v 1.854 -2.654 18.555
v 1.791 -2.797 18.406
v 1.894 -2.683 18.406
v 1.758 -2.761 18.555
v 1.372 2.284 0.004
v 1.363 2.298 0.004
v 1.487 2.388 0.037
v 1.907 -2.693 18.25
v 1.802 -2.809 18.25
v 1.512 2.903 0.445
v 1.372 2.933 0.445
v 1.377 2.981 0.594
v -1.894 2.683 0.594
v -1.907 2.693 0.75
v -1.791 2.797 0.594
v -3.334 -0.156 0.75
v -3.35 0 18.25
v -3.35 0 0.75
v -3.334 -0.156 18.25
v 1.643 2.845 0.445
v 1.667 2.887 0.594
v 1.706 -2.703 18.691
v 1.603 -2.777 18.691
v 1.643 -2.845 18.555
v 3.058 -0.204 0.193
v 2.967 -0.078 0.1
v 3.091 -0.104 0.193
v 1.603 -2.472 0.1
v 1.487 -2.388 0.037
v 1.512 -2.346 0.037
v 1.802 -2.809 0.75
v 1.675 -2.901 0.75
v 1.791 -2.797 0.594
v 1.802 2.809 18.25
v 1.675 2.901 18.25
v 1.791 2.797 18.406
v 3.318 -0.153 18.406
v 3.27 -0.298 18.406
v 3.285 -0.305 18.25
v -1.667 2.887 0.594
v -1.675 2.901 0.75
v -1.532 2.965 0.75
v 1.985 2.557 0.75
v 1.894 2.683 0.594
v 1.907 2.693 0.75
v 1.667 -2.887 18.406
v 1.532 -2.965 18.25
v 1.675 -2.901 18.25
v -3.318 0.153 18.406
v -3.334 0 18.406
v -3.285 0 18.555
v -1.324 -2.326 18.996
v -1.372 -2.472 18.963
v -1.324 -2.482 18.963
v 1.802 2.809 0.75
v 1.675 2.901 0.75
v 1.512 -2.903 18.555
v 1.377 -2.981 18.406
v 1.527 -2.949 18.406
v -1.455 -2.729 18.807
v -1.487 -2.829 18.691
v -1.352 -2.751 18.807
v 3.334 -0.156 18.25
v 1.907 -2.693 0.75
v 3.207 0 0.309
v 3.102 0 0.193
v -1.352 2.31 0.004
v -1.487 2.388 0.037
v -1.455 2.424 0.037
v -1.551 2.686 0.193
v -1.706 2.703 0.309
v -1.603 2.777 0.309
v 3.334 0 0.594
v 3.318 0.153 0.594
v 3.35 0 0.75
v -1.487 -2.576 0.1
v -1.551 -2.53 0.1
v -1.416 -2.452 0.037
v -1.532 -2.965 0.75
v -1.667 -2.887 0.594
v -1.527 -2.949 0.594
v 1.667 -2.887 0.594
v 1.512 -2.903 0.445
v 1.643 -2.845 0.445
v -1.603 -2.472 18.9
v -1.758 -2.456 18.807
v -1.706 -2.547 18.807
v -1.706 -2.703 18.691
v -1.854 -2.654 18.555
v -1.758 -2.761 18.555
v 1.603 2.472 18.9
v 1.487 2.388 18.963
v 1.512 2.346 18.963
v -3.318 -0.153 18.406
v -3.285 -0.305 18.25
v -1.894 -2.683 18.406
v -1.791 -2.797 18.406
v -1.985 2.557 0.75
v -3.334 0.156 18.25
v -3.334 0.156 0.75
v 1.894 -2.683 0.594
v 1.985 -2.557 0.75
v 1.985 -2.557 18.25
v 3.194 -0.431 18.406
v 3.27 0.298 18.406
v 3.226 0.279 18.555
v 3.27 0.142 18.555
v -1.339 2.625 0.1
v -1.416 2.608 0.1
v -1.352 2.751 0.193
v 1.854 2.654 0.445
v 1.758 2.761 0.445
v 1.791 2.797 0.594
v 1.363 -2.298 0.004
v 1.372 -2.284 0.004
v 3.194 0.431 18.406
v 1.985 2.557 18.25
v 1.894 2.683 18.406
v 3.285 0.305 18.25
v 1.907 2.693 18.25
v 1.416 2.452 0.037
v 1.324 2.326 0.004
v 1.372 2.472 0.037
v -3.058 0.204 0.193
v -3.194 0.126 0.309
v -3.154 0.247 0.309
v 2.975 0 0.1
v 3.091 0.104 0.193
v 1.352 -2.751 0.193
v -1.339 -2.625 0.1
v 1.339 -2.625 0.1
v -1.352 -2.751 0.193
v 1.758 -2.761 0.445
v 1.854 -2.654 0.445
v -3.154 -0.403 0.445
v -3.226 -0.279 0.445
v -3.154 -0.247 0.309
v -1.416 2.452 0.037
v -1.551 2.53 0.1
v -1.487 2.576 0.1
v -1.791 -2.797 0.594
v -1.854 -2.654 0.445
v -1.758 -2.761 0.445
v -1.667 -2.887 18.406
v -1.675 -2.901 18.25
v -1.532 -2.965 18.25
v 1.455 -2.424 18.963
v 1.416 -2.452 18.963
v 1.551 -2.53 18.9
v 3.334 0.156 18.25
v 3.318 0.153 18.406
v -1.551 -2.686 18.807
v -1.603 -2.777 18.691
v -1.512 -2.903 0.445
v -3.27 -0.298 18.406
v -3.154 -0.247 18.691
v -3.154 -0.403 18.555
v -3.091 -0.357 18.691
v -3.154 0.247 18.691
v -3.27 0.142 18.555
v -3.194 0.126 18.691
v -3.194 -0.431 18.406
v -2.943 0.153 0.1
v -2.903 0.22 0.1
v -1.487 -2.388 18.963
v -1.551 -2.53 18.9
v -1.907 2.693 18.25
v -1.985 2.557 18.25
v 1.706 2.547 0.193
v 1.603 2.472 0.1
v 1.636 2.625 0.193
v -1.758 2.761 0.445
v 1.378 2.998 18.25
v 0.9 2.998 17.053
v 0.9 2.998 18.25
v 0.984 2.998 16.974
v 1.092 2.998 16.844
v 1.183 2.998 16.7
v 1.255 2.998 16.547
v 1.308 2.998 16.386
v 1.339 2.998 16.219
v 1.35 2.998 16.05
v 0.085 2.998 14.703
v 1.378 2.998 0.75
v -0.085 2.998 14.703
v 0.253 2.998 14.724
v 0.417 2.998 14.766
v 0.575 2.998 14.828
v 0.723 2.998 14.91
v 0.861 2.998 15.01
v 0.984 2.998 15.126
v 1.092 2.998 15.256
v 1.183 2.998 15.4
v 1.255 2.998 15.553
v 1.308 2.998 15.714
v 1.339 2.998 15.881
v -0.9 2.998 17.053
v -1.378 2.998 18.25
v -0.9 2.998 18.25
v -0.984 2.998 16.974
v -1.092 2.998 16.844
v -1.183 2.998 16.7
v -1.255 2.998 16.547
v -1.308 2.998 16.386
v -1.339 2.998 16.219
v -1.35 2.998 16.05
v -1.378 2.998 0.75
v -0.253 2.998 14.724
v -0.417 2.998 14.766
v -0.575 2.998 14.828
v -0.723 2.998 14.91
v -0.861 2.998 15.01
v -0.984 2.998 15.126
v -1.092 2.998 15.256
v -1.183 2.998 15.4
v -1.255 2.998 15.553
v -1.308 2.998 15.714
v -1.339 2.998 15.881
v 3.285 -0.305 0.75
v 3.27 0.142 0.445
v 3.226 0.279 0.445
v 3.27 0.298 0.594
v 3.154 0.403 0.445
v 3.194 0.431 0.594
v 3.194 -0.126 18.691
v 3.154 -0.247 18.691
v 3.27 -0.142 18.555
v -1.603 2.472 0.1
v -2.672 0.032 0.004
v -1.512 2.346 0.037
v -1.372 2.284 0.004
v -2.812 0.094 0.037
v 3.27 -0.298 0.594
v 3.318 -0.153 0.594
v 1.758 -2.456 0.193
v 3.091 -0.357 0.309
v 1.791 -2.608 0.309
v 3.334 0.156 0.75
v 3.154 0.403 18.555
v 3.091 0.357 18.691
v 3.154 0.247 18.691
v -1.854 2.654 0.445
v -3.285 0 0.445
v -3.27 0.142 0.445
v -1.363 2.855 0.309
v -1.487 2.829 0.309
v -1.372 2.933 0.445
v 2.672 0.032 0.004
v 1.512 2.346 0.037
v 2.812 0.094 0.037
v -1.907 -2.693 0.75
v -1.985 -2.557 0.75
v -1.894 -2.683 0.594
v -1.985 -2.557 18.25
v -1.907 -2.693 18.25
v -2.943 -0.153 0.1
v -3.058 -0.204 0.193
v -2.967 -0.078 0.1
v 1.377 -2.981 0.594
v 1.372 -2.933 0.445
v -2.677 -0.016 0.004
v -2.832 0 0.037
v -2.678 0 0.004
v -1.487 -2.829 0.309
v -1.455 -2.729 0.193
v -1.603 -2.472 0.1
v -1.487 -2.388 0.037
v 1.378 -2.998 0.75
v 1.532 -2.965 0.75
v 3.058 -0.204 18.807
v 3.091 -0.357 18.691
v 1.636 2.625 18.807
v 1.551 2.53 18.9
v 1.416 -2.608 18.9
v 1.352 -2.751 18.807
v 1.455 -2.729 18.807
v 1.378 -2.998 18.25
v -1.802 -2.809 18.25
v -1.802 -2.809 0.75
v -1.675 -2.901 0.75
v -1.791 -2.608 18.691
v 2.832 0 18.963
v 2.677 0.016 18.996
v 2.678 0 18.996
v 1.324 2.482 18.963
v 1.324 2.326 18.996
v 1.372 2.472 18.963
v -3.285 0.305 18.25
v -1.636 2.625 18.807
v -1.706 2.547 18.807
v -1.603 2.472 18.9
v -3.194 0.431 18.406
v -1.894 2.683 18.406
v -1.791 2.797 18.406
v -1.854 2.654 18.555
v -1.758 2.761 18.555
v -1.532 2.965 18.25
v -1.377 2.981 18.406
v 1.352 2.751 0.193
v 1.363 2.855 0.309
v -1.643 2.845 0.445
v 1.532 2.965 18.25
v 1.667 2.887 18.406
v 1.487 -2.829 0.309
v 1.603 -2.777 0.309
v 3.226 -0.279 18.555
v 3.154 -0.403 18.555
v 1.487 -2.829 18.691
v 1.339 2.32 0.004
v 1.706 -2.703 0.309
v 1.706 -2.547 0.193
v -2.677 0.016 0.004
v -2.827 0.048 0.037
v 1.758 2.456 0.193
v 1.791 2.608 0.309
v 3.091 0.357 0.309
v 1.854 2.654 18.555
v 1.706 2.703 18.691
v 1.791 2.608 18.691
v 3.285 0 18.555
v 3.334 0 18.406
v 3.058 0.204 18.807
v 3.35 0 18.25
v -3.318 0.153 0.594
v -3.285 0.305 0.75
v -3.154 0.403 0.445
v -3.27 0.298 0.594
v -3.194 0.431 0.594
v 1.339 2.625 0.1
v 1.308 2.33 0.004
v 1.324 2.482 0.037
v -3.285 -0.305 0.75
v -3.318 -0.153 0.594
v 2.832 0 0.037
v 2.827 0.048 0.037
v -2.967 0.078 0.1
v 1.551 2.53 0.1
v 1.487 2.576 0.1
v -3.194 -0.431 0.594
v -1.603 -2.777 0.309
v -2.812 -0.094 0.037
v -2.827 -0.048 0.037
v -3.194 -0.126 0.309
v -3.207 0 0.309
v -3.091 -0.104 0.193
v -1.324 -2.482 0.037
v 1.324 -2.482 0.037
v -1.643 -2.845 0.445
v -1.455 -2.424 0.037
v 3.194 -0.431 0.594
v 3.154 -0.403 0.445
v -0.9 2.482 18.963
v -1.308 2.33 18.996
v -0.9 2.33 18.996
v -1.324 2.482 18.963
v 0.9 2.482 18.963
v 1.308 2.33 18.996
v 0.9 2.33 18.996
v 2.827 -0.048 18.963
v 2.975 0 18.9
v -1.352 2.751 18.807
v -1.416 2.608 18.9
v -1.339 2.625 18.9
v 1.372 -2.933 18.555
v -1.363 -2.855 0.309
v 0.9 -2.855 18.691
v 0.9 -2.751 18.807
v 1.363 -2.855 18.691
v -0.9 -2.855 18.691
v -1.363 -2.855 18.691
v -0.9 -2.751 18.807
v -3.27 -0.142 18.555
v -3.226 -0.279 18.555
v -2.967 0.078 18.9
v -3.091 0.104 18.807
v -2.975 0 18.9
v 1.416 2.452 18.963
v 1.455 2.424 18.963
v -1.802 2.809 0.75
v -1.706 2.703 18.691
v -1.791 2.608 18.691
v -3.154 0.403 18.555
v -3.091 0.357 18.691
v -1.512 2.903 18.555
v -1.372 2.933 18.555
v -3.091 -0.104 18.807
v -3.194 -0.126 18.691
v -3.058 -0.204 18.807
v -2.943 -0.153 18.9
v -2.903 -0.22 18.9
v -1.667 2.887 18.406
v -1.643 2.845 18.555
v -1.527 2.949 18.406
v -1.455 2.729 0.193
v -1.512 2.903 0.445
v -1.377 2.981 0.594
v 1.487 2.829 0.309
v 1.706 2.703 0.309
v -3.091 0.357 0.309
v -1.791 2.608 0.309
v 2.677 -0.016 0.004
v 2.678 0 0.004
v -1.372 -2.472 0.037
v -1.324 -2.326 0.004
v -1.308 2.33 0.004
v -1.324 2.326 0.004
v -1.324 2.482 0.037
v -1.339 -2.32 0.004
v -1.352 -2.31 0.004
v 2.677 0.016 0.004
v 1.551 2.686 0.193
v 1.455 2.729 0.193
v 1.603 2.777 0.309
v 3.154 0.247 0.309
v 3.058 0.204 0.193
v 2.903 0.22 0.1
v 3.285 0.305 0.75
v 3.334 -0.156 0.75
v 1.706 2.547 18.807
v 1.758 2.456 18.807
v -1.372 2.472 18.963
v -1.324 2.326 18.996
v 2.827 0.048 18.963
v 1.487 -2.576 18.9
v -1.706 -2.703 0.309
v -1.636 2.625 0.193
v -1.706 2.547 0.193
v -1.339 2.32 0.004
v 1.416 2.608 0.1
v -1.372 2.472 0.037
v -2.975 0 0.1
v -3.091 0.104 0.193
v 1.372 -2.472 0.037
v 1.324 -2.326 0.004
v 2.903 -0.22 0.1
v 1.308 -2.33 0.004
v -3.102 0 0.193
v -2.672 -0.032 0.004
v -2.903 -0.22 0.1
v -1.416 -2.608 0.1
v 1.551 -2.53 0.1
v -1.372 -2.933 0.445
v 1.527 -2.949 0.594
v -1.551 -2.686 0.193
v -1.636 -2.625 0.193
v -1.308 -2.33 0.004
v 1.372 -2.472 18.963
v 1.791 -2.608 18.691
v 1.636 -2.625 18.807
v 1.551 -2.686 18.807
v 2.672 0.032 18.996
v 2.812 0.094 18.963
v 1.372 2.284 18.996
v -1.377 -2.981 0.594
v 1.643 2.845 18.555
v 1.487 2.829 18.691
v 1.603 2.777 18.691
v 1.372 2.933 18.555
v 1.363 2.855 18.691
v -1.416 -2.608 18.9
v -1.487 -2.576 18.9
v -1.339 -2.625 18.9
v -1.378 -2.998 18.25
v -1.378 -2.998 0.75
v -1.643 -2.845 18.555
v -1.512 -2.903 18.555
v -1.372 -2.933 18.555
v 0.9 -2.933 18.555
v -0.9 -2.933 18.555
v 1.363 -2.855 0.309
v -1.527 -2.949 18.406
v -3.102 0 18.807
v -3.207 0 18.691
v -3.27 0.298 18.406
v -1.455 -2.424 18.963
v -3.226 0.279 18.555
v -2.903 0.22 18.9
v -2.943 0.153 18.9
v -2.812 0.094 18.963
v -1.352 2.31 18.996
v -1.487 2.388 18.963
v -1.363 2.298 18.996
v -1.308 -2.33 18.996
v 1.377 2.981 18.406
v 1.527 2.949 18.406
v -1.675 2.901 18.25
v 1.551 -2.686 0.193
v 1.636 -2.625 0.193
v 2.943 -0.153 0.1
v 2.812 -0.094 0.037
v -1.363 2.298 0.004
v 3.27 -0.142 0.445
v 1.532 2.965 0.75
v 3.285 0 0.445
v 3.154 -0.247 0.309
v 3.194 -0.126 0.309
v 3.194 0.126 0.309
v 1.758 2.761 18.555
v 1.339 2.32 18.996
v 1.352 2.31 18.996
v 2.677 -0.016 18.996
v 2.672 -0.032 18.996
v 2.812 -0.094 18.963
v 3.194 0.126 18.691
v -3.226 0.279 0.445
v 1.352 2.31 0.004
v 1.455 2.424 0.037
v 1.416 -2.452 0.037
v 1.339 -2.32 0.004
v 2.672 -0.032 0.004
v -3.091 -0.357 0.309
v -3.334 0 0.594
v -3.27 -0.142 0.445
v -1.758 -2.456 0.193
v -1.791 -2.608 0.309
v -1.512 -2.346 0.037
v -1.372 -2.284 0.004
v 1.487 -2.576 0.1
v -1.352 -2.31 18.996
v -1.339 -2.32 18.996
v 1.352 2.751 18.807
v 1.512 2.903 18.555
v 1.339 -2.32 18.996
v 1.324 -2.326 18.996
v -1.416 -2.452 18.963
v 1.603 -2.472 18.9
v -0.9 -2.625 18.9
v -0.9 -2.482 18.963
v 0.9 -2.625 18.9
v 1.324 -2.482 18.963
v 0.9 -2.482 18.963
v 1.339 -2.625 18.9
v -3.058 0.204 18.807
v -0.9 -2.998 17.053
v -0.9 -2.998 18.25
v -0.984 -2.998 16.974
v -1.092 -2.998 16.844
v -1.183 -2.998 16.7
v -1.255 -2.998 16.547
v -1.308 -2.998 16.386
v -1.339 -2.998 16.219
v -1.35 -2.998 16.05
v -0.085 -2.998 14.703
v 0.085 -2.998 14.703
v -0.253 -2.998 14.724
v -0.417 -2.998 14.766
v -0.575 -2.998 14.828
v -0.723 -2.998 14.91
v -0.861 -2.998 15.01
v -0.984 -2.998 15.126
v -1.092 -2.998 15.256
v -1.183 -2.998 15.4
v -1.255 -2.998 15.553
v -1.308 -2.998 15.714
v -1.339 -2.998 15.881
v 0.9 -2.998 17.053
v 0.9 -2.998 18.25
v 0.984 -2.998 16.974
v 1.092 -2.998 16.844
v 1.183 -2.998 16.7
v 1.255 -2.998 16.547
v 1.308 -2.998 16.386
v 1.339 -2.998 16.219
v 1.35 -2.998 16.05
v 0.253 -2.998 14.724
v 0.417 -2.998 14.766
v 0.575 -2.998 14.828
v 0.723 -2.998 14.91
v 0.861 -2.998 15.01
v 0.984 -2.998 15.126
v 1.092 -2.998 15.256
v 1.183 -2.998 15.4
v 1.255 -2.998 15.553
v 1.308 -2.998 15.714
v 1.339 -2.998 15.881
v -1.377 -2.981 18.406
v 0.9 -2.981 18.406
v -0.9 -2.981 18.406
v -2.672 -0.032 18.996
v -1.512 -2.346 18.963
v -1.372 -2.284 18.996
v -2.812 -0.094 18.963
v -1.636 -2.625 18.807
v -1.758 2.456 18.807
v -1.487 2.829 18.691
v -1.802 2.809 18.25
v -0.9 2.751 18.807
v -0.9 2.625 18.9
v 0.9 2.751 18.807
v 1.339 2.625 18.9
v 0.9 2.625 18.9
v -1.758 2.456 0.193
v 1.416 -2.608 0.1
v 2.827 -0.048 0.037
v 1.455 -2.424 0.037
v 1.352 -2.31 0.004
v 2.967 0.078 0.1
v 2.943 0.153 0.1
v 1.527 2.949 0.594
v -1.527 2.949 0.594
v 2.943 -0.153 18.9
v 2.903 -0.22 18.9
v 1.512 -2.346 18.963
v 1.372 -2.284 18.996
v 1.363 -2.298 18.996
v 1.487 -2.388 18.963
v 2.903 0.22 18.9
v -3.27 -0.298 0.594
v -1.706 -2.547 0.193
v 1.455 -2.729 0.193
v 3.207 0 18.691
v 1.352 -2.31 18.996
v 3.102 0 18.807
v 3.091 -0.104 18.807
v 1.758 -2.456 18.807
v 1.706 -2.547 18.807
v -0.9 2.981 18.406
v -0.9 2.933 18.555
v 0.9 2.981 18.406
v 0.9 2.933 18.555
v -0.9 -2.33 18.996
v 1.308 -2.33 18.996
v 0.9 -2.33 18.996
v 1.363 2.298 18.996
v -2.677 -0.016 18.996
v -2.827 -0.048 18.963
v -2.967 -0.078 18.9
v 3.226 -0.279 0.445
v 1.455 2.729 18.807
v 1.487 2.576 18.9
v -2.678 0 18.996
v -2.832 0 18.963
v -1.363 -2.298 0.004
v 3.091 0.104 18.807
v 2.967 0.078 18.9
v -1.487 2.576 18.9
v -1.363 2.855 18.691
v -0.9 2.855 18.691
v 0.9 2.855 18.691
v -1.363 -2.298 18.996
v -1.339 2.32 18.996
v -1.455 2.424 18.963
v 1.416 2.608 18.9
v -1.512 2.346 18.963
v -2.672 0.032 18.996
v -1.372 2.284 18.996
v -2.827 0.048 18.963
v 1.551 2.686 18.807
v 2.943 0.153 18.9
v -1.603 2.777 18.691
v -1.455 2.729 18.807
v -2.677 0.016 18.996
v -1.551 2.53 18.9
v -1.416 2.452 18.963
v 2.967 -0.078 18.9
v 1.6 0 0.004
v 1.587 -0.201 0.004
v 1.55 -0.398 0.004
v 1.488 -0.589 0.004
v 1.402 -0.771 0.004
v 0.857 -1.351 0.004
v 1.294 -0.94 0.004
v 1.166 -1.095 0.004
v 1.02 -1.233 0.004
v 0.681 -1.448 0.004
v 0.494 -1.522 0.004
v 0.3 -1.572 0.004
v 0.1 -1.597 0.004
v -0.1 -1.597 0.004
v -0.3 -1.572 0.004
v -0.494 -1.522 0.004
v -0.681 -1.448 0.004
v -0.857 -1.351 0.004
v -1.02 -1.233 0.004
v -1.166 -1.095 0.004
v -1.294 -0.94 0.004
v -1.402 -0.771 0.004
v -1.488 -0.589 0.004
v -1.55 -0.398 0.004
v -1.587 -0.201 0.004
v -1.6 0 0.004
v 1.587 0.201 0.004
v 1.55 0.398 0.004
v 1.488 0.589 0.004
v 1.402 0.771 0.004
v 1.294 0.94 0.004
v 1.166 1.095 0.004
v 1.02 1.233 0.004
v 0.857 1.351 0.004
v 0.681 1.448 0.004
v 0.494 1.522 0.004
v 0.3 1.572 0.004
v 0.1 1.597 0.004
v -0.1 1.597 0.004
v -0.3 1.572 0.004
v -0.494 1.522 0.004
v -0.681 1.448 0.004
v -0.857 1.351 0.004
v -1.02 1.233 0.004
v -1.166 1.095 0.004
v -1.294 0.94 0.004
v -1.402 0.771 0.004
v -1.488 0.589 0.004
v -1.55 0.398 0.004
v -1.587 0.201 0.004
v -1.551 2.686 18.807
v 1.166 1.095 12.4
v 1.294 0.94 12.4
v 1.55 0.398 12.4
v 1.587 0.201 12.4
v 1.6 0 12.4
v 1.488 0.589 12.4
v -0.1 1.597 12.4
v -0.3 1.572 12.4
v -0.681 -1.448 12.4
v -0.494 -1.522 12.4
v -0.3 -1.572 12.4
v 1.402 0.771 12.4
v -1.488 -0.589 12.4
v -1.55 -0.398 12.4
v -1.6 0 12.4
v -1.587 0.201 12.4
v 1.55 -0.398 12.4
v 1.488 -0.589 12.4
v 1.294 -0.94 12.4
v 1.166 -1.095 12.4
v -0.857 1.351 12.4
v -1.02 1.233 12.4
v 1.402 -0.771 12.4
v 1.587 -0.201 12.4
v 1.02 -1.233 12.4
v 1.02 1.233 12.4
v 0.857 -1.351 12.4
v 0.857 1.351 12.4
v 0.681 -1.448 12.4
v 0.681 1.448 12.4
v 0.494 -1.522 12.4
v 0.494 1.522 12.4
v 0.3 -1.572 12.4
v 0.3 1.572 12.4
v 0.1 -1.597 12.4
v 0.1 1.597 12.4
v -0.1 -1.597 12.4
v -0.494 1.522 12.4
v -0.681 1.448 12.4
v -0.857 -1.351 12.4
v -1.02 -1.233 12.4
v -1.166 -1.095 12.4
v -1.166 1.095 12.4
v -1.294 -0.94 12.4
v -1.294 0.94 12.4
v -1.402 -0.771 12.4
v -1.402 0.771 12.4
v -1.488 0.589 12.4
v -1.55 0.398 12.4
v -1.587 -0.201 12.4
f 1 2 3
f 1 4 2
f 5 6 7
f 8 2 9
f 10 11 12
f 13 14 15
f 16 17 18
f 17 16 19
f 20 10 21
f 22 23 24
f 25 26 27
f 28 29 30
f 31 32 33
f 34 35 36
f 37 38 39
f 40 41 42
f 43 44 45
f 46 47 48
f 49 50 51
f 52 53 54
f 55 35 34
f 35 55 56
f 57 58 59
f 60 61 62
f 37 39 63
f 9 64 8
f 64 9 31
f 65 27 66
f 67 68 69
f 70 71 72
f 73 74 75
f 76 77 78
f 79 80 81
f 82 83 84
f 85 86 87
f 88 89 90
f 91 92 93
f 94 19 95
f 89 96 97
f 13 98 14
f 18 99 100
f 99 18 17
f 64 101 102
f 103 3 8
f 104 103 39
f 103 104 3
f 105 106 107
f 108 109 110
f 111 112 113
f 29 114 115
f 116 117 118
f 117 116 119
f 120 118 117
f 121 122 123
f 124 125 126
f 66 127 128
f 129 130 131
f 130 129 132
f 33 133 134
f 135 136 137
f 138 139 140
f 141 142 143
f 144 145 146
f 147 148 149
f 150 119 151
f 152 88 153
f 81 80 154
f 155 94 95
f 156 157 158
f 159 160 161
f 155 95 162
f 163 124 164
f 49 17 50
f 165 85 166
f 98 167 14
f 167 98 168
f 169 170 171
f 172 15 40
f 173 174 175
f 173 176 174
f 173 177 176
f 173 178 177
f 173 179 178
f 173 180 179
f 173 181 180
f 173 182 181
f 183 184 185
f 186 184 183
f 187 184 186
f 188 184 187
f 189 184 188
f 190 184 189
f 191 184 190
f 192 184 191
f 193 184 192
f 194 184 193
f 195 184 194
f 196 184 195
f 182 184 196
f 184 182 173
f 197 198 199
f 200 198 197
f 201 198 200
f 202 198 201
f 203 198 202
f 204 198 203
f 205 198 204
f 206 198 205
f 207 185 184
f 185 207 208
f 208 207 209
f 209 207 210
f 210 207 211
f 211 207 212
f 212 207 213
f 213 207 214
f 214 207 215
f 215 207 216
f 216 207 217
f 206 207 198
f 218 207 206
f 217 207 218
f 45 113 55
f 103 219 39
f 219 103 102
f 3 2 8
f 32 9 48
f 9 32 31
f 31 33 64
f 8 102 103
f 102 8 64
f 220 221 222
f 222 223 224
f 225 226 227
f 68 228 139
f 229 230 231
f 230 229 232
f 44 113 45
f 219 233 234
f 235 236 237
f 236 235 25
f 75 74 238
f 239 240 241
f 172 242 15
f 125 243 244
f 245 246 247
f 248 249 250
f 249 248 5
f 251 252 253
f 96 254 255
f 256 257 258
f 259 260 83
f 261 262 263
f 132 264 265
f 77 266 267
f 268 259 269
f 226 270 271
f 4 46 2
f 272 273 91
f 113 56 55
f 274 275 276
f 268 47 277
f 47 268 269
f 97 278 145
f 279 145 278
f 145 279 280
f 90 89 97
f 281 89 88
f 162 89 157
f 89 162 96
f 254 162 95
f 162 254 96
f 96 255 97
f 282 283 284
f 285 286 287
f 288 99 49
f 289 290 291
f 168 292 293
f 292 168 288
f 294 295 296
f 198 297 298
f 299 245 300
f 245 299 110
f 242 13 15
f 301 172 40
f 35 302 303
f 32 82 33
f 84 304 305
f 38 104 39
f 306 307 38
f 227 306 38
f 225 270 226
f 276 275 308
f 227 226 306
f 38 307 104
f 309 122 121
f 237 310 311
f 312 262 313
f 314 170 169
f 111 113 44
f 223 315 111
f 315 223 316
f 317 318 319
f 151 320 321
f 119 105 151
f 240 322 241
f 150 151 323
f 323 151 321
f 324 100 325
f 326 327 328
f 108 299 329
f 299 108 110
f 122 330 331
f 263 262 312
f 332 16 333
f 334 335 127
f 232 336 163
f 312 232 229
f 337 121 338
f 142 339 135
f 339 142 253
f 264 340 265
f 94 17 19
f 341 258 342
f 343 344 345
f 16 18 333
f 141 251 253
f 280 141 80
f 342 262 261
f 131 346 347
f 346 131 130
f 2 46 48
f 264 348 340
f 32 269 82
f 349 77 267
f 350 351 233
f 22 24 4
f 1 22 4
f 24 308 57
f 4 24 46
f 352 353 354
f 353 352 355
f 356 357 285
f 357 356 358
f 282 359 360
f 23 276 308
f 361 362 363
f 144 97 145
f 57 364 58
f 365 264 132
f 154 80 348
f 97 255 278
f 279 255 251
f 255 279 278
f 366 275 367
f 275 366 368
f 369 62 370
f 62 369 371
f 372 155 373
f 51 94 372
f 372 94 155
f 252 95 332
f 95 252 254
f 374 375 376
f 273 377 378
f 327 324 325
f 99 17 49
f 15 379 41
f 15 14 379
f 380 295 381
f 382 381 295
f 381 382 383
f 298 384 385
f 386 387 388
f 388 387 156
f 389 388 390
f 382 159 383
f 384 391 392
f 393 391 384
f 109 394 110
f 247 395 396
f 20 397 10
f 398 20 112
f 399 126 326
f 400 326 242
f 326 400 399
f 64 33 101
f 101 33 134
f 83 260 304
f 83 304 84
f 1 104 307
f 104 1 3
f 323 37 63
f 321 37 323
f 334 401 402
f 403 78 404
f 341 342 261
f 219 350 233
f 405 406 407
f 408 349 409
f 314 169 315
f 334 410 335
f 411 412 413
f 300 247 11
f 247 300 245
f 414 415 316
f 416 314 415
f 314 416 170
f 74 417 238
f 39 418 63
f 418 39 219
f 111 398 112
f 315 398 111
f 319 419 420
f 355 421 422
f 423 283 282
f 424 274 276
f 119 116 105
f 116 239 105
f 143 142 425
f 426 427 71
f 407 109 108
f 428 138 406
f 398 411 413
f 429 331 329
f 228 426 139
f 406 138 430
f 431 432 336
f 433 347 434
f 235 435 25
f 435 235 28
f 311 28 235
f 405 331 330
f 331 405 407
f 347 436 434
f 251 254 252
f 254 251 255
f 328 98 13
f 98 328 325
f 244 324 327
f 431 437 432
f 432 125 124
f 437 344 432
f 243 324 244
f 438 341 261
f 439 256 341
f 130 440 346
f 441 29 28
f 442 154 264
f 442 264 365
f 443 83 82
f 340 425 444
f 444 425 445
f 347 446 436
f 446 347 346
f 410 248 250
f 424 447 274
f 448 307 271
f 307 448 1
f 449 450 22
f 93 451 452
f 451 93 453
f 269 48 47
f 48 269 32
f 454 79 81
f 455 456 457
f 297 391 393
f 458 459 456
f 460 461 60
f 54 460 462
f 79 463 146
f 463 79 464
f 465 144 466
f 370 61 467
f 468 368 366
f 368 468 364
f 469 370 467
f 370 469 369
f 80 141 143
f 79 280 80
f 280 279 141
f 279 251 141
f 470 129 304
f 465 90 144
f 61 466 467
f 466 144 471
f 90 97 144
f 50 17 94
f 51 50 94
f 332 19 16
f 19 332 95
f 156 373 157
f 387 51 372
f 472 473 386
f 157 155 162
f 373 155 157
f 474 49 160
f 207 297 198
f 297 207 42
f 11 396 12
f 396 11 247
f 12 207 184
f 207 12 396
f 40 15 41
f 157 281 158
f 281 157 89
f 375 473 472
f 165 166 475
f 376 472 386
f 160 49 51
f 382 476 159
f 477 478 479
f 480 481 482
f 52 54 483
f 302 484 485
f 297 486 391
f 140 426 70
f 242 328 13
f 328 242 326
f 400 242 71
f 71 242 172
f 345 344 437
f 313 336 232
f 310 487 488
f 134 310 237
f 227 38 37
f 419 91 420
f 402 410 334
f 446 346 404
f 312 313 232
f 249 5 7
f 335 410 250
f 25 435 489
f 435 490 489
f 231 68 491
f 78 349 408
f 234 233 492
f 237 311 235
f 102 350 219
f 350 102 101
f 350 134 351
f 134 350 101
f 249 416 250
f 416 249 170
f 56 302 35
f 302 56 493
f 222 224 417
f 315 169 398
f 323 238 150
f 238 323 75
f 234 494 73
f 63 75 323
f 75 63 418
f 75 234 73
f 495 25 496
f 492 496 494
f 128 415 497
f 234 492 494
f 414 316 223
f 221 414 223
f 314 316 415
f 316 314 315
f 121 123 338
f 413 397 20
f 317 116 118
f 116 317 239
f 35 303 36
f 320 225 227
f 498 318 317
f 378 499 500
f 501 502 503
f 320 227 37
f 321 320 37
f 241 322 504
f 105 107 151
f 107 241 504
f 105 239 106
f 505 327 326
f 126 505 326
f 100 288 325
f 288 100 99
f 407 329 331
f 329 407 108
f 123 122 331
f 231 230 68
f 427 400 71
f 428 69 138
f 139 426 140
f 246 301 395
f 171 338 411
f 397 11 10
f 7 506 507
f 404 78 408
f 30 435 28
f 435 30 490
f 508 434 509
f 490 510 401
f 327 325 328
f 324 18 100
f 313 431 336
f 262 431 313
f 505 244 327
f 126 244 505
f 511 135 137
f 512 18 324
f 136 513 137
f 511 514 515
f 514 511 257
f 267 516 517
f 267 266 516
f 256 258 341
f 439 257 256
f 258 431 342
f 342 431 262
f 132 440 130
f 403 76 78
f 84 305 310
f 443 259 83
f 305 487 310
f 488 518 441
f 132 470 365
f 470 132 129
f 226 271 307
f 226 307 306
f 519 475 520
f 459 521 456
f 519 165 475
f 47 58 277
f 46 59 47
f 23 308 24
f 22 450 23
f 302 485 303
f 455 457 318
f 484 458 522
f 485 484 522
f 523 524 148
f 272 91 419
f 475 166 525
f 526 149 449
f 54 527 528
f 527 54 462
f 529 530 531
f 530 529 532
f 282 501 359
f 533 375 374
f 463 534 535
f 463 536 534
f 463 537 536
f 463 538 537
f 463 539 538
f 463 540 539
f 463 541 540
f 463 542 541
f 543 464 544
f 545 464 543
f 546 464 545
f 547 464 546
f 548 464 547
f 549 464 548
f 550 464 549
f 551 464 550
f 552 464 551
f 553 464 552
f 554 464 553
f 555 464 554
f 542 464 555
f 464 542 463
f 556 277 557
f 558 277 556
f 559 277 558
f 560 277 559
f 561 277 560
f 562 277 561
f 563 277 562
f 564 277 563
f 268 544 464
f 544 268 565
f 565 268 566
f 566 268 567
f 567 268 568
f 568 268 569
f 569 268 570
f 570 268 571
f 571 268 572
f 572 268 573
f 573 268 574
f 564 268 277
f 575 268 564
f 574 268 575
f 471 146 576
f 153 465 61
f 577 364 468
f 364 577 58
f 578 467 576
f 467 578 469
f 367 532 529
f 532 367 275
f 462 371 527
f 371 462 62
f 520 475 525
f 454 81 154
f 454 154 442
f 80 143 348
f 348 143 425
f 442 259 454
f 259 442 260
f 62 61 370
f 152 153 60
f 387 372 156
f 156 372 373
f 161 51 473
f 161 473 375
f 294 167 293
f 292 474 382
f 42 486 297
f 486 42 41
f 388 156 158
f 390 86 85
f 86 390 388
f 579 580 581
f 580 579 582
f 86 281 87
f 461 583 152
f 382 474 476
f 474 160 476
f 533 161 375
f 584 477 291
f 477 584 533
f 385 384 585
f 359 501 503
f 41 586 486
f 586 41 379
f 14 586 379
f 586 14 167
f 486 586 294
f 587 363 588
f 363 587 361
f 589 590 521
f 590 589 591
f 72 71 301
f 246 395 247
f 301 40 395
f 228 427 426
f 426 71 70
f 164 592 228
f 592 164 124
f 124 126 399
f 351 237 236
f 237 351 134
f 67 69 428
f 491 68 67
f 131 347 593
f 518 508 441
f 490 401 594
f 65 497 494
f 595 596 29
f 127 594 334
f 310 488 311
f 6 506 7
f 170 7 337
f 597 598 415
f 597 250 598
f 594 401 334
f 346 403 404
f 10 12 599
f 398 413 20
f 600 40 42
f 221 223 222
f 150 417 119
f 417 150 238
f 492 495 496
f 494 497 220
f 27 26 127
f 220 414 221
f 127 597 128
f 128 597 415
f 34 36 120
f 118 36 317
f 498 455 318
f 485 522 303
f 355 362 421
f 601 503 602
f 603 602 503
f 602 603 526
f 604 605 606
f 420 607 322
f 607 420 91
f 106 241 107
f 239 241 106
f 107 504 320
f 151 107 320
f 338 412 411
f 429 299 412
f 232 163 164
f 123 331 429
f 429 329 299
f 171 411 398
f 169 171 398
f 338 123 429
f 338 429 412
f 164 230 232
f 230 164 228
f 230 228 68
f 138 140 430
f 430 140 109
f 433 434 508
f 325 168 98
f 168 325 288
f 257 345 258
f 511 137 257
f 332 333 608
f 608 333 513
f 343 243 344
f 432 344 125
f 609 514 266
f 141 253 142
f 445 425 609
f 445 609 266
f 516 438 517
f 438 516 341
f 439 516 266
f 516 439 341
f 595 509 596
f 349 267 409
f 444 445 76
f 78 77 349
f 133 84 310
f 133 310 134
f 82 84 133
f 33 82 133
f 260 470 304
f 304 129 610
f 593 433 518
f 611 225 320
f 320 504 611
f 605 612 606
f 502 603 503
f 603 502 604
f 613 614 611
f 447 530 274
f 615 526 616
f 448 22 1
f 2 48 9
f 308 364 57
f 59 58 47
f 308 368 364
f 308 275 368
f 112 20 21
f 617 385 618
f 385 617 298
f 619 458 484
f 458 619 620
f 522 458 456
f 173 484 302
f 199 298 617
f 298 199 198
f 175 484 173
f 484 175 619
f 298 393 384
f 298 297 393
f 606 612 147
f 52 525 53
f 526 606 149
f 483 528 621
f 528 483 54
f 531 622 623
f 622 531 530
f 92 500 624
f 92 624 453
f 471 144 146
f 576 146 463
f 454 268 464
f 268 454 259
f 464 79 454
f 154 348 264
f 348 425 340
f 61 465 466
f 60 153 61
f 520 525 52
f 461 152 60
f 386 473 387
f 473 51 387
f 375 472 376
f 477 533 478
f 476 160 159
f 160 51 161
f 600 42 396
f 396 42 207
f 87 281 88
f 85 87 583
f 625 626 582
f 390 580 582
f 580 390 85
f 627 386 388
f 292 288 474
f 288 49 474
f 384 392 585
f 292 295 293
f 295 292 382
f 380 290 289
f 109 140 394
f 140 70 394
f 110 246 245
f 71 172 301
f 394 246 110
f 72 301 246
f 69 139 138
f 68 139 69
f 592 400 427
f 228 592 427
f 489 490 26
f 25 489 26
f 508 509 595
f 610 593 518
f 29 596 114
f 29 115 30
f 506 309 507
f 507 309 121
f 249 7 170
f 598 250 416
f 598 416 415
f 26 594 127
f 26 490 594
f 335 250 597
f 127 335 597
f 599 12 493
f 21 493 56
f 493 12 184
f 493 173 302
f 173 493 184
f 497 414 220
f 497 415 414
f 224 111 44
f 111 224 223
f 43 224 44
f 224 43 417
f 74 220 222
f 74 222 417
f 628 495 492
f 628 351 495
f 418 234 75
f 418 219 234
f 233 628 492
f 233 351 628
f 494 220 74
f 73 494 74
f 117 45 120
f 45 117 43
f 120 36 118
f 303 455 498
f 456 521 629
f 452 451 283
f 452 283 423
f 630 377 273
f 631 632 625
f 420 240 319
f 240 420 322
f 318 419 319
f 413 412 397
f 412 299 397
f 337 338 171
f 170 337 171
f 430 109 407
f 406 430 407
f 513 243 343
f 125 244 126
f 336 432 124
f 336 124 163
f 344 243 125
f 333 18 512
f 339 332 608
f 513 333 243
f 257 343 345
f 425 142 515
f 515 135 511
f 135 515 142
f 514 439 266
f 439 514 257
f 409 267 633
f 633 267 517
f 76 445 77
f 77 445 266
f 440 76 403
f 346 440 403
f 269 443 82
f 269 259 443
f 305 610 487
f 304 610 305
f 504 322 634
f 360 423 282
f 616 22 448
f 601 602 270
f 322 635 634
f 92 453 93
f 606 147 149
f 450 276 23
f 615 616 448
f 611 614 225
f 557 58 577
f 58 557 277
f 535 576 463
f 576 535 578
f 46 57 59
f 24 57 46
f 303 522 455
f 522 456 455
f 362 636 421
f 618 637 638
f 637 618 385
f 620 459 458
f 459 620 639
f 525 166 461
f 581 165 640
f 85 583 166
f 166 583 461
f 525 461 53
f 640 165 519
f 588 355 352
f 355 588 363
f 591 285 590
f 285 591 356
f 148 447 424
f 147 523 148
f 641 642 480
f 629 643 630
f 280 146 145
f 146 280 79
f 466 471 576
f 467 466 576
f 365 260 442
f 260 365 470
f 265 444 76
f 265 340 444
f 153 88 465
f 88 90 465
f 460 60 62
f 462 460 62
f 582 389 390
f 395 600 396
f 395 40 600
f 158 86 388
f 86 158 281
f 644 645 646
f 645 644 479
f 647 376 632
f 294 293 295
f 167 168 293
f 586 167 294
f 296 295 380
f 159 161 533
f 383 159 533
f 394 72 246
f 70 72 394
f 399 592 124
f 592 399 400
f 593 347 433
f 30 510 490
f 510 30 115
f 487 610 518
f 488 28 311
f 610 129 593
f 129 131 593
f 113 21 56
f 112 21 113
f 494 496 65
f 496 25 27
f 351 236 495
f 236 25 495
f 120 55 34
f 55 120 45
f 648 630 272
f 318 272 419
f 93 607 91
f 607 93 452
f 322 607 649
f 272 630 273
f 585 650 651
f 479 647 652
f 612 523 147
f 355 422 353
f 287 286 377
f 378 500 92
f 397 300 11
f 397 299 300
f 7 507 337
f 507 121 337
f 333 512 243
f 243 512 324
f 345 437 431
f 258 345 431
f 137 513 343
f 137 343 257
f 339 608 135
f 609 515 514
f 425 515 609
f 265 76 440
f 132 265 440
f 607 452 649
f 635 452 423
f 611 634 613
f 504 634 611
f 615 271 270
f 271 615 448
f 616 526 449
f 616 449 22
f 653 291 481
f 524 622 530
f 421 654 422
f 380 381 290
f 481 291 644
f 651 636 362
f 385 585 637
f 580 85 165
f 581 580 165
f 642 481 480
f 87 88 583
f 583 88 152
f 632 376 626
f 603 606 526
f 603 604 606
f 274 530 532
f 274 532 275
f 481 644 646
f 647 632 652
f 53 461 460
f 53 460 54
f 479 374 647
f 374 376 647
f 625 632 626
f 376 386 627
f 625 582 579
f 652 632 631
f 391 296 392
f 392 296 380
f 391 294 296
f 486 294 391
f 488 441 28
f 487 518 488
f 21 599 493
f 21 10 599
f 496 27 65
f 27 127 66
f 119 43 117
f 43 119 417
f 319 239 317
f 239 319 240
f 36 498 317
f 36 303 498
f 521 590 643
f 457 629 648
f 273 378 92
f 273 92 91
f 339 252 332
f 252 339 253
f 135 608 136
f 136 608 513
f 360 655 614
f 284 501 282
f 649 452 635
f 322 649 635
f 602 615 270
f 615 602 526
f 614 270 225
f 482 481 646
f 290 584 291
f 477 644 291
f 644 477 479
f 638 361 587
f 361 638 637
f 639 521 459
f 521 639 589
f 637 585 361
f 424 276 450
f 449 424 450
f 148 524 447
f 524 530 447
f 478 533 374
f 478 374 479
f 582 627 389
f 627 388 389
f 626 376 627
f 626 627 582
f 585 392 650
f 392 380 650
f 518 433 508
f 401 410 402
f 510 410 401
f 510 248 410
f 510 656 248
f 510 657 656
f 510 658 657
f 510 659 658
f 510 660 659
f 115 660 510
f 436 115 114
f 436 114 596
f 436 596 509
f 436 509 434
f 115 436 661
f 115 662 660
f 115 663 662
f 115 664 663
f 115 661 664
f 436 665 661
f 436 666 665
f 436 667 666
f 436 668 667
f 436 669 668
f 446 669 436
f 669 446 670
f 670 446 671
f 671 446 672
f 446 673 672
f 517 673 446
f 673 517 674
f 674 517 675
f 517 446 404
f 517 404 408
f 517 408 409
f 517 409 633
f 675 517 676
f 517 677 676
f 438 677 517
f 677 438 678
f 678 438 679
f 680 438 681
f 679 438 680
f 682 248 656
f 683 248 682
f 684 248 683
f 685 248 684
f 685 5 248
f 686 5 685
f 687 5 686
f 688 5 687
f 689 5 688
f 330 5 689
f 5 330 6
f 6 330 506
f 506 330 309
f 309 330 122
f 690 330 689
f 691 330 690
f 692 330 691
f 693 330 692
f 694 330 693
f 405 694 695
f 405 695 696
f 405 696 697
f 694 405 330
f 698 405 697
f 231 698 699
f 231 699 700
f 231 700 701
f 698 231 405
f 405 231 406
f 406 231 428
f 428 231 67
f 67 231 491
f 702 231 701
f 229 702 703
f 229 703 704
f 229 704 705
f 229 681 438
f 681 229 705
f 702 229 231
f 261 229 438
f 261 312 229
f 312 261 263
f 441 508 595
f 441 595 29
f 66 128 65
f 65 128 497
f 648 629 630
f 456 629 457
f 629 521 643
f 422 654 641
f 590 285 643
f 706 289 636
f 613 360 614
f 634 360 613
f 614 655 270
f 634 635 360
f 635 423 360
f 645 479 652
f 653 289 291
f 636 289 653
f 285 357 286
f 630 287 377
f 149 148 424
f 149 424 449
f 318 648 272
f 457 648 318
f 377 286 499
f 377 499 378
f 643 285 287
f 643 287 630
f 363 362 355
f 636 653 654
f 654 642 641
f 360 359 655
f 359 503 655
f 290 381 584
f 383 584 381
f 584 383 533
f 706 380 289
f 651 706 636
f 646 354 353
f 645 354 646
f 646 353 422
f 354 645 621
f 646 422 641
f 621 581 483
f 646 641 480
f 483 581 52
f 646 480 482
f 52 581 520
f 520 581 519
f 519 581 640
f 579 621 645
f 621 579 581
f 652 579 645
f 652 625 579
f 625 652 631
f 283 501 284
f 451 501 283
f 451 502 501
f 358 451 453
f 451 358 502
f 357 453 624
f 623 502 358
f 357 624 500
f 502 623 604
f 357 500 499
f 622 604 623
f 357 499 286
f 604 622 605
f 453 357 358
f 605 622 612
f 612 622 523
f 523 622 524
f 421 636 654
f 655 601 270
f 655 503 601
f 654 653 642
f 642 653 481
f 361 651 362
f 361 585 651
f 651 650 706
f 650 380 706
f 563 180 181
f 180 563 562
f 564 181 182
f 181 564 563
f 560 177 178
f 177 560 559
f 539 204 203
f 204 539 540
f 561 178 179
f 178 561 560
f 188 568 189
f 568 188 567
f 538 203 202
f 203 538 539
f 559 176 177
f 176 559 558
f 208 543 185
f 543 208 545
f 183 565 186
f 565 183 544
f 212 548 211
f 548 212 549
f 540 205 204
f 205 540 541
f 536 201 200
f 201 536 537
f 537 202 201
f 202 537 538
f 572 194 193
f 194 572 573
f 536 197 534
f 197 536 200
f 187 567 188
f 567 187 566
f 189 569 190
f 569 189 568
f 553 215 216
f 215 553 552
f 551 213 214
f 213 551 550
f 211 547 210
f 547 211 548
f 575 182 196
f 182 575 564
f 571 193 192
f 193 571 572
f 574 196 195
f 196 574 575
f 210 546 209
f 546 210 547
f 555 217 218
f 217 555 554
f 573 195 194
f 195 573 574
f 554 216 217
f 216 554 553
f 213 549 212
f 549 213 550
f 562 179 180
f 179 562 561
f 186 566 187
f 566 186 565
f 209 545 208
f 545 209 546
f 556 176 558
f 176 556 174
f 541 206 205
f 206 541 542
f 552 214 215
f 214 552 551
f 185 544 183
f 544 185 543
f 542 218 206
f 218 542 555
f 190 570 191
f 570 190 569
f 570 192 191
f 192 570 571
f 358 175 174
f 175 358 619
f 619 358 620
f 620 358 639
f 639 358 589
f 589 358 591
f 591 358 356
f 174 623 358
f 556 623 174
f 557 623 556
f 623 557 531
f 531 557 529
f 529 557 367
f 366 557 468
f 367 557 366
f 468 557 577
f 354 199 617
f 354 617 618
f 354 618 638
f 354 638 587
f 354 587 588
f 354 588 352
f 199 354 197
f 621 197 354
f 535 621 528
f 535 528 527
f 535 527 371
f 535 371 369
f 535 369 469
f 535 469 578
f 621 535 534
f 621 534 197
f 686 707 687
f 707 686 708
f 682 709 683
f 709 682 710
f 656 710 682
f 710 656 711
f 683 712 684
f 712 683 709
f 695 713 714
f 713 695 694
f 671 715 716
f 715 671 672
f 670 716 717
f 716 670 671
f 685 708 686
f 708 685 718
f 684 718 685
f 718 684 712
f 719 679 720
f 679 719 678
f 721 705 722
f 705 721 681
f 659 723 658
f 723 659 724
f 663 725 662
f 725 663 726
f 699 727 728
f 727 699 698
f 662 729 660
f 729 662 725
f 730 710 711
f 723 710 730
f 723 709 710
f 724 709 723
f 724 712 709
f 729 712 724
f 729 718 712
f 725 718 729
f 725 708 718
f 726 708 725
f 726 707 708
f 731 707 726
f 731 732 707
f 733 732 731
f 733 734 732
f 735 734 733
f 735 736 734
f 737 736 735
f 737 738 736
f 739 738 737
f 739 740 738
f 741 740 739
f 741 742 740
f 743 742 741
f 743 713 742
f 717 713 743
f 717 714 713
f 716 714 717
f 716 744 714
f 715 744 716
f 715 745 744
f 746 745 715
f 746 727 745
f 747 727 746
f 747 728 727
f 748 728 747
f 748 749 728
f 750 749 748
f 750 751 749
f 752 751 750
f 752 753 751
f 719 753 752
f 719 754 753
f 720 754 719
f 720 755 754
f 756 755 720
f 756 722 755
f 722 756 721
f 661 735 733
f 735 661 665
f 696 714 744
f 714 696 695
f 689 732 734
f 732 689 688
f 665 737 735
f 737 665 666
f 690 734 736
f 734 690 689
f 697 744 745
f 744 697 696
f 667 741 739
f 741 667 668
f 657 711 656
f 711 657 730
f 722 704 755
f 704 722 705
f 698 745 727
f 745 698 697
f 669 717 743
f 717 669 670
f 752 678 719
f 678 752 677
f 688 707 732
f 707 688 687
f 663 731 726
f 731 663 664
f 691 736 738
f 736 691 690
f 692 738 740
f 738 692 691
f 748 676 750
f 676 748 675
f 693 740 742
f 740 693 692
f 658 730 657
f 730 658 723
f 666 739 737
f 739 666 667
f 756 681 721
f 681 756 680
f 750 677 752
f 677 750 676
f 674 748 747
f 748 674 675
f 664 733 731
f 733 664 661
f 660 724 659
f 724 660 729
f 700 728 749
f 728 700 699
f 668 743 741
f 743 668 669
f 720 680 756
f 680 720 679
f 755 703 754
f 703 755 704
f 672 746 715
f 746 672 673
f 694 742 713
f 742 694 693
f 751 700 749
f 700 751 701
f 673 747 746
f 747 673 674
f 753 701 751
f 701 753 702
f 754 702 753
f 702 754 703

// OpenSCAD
//CC BY-NC Katrien van Riet

//VARIABLES in mm!
diameter = 3.2;
length = 17.5;
depth = 13;
wall_thickness = 1; //at the corners (due to hexagon)
hole = 2.7;
fillet = .75;

visualisation = "no" ; //change to "yes" to preview rod placement
crossSection = "no" ; //change to "yes" to see cross-section



//BETTER NOT TO CHANGE THIS
radius = diameter/2+wall_thickness;
$fn=50;

//HERE BE CODE
mirror([1,0,0])
    rotate([90,0,90])
        if (visualisation == "yes") {
            color("Gray")
                translate([0,0,-hole/2-10])
                    cylinder(d=diameter+.01,h=depth+10);
        }
    
module cap(){
    color("LightBlue",.7)
    difference(){
        minkowski($fn=20){
            cylinder(d=diameter+wall_thickness*2, h=length, $fn=6);
            sphere(fillet,$fn=30);
        }
        translate([0,diameter,depth+2.3])
            rotate([90,0,0])
                cylinder(d=hole,h=diameter*2);
        translate([0,0,length-(length-depth)/2+hole/2])
            cube([hole/1.5,diameter*2,length-depth],center=true);
        translate([0,0,-hole/2])
            cylinder(d=diameter,h=depth);
        if (crossSection == "yes"){
            translate([-25,0,-1])
                cube([50,10,100]);
        }
    }
}


translate([0,0,fillet])
    cap();
